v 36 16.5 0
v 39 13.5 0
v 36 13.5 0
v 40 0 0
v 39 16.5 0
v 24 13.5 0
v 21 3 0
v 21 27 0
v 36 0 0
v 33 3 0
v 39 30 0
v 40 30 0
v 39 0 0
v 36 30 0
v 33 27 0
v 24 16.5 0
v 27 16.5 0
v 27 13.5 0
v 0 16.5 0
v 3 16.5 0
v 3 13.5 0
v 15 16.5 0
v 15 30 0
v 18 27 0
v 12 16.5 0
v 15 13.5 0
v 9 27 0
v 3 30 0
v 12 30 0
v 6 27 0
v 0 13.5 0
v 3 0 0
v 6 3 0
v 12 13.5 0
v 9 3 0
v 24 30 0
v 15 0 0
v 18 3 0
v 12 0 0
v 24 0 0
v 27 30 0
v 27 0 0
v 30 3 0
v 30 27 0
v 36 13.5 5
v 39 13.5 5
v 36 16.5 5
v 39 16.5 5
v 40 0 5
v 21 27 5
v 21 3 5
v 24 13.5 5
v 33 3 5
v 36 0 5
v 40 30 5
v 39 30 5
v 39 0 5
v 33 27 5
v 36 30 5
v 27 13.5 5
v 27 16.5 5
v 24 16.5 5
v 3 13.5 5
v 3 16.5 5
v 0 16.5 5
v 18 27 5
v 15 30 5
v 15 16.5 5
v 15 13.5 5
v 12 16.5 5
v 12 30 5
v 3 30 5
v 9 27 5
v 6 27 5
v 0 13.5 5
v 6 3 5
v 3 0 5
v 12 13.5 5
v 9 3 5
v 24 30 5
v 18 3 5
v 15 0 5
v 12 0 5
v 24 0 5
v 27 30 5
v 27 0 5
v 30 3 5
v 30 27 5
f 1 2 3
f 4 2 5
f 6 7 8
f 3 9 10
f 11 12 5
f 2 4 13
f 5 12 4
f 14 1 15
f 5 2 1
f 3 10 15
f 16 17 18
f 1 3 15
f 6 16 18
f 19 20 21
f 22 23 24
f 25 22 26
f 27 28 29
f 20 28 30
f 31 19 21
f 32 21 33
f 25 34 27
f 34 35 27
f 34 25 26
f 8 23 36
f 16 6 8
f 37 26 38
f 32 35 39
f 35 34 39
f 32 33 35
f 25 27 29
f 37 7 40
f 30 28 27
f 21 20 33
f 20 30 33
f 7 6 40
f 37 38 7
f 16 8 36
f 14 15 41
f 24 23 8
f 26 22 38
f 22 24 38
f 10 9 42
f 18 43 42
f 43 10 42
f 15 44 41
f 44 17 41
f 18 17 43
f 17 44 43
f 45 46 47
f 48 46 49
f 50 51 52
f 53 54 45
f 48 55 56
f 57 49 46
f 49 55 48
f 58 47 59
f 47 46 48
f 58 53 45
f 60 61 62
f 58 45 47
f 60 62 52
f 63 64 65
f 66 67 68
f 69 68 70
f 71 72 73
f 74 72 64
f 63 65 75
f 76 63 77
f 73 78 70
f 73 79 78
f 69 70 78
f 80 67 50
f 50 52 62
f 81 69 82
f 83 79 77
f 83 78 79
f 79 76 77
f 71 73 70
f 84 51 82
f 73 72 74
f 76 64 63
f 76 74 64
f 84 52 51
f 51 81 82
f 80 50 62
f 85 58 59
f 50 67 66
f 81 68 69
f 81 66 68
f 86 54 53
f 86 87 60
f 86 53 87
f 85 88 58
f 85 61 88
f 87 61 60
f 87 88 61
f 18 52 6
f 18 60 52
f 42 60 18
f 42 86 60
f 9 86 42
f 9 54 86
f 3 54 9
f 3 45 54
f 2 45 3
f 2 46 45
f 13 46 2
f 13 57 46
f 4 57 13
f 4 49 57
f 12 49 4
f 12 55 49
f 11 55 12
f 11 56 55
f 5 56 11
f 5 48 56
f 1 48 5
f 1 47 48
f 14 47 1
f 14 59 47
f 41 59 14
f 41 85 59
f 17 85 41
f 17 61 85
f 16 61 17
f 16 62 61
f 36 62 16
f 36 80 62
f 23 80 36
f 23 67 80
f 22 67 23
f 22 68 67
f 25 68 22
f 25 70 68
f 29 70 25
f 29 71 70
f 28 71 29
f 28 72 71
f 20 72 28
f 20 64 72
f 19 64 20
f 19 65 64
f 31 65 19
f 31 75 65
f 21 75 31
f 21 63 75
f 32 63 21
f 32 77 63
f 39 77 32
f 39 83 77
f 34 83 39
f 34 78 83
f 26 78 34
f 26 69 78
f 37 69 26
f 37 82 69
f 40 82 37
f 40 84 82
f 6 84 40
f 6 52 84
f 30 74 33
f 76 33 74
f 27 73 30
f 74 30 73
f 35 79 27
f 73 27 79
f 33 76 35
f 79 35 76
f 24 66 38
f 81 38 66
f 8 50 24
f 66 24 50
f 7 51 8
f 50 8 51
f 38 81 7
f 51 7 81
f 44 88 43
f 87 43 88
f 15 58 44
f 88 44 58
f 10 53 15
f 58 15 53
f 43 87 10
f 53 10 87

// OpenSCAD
//Living Hinge
//Ari M Diacou
//Metis Industries
//August 2016

//Thanks to Ronaldo Persiano for the inspiration for add_hinge()

///////////////////////////// Parameters /////////////////////////////////////
//The y dimension of the hinge, parallel to the laser cuts
length=30;
//The x dimension of the hinge, transverse to laser cuts
width=40;
//The distance between parallel laser cuts
d=6;
//The distance between 2 collinear laser cuts
hinge_length=3;
//The number of hinges across the length of the hinge
hinges_across_length=1;
//How thick do you want the hinge to be
height=5;
///////////////////////////////// Main() //////////////////////////////////////
//preview[view:north, tilt:top]
linear_extrude(height) hinge(length=length,width=width,d=d,minimum_thinness=.01,hinge_length=hinge_length,hinges_across_length=hinges_across_length);
////Uncomment lines to see samples (all flat for DXF exporting)
//hinge();
//hinge(d=6);
//hinge(length=20, width=39,d=6,hinge_length=2.5,hinges_across_length=2,minimum_thinness=3);
//hinge(length=30, width=20,d=2,hinge_length=2.5,hinges_across_length=2,minimum_thinness=3,center=true);
//hinge(length=20, width=40,d=3,hinge_length=4,hinges_across_length=0,minimum_thinness=1);
//linear_extrude(height=5) hinge(length=20, width=40,d=6,hinge_length=2.5,hinges_across_length=2,minimum_thinness=3);
//add_hinge(width=20,length=length,center=true) square([3*length,length-1],center=true);
//add_hinge(width=20,length=90) translate([5,0]) circle(d=90);
//add_hinge(width=30,length=90,hinges_across_length=3) circle(d=90);
//add_hinge(width=30,length=90,hinges_across_length=3,center=false) circle(d=90);
//add_hinge(width=30,length=90,hinges_across_length=3,minimum_thinness=.1) circle(d=90);

/////////////////////////////// Functions /////////////////////////////////////
module hinge(length=30,width=20,d=3,minimum_thinness=3,hinge_length=3,hinges_across_length=2,center=false){
    //length = the y dimension of the hinge, parallel to the laser cuts
    //width = the x dimension of the hinge, transverse to laser cuts
    //d=the distance between parallel laser cuts
    //What is the minimum distance that two parallel lines can be apart before the laser does something catastrophic? E.g. setting uncontrollable fire to the work piece. This is "minimum_thinness"
    //hinge_length=the distance between 2 colinear laser cuts
    //hinges_across_length=the number of hinges across the length of the hinge
    //center is a boolean value, if true, place the center of the rectangle at the origin, if false, put the bottom left corner at the origin (just like square() and cube())
    ep=.00101;//epsilon, a small number,=1.01 micron, a hack (for OpenSCAD 2015.03) used to make square()'s which look like lines (which OpenSCAD doesn't support). Hopefully, your laser has a function which says something like "ignore cuts less than THRESHOLD apart", set that to anything greater than ep.
    adjust=center?-[width,length]/2:[0,0];//a vector for adjusting the center position
    th=d/2<minimum_thinness?ep:d/2;//If the distance between lines is less than the minimum thickness, just make linear cuts, specifically, set the width=th=thickness of the squares to ep, which is just above 1 micron (for 1=1mm slicers)
    n=floor(width/d);
    m=floor(abs(hinges_across_length)); echo(str("Number of hinges (m)=",m)); //input cleaning, ensures m ϵ {non-negative integers}
    echo(str("Suggested filename: Living Hinge-",length,"x",width,"mm-h=",m,"x",hinge_length,"-th=",th));
    echo(str("The distance between parallel laser cuts (d) is: ",d," mm."));
    //the length of the short lines
    short=(length-m*hinge_length)/(m+1);
    //the length of the long lines
    long=(length-(m+1)*hinge_length)/(m);
    echo(str("There should be n=",n," links in the hinge."));
    translate(adjust) difference(){ 
        square([width,length],center=false);
        if(m==0) 
            //In the special case where |hinges_across_length|<1, the hinge should look like:
            // |  --------------------------------------|
            // |--------------------------------------  |
            // |  --------------------------------------|
            // |--------------------------------------  |
                for(i=[0:n])
                    translate([i*d,(pow(-1,i))*hinge_length]) // (-1)^i,{iϵZ} = {-1,+1,-1,+1,...}
                        square([th,length]);                
        else
            //A hinge with hinges_across_length=2 should look like:
            // |------------  ------------  ------------|
            // |  -----------------  -----------------  |
            // |------------  ------------  ------------|
            // |  -----------------  -----------------  |
            for(i=[0:n]){ //Iterating across x
                translate([i*d*1,0]){ //Do the x translation seperate from the y translations
                    if(i%2==1) //For odd columns
                        for(j=[0:m-1]){
                            translate([0,hinge_length+j*(long+hinge_length)]) 
                                square([th,long]);
                            }
                    if(i%2==0) //For even columns
                        for(j=[0:m]){
                            translate([0,j*(short+hinge_length)]) 
                                square([th,short]);
                        }
                    }
                }
            }
    }
    
module add_hinge(length=30,width=20,d=3,minimum_thinness=3,hinge_length=3,hinges_across_length=2,center=true){
    //add_hinge() modifies another 2D object, by adding a hinge which is centered on the origin (by default, this can be changed to false, so that the bottom left corner of the hinge is at the origin. It uses the same parameters as hinge(). 
    //First, difference() a rectangle the size of the hinge from the child object (makes a hole for the hinge
    //Second, union() a hinge with First (puts the hinge in the hole)
    //Third, intersection() the child object with Second (cuts off any extra hinge that sticks out past the child object)
    intersection(){
        children();
        union(){
            hinge(length=length,width=width,d=d,minimum_thinness=minimum_thinness,hinge_length=hinge_length,hinges_across_length=hinges_across_length,center=center);
            difference(){
                children();
                square([width,length],center=center);
                }
            }
        }
    }    
